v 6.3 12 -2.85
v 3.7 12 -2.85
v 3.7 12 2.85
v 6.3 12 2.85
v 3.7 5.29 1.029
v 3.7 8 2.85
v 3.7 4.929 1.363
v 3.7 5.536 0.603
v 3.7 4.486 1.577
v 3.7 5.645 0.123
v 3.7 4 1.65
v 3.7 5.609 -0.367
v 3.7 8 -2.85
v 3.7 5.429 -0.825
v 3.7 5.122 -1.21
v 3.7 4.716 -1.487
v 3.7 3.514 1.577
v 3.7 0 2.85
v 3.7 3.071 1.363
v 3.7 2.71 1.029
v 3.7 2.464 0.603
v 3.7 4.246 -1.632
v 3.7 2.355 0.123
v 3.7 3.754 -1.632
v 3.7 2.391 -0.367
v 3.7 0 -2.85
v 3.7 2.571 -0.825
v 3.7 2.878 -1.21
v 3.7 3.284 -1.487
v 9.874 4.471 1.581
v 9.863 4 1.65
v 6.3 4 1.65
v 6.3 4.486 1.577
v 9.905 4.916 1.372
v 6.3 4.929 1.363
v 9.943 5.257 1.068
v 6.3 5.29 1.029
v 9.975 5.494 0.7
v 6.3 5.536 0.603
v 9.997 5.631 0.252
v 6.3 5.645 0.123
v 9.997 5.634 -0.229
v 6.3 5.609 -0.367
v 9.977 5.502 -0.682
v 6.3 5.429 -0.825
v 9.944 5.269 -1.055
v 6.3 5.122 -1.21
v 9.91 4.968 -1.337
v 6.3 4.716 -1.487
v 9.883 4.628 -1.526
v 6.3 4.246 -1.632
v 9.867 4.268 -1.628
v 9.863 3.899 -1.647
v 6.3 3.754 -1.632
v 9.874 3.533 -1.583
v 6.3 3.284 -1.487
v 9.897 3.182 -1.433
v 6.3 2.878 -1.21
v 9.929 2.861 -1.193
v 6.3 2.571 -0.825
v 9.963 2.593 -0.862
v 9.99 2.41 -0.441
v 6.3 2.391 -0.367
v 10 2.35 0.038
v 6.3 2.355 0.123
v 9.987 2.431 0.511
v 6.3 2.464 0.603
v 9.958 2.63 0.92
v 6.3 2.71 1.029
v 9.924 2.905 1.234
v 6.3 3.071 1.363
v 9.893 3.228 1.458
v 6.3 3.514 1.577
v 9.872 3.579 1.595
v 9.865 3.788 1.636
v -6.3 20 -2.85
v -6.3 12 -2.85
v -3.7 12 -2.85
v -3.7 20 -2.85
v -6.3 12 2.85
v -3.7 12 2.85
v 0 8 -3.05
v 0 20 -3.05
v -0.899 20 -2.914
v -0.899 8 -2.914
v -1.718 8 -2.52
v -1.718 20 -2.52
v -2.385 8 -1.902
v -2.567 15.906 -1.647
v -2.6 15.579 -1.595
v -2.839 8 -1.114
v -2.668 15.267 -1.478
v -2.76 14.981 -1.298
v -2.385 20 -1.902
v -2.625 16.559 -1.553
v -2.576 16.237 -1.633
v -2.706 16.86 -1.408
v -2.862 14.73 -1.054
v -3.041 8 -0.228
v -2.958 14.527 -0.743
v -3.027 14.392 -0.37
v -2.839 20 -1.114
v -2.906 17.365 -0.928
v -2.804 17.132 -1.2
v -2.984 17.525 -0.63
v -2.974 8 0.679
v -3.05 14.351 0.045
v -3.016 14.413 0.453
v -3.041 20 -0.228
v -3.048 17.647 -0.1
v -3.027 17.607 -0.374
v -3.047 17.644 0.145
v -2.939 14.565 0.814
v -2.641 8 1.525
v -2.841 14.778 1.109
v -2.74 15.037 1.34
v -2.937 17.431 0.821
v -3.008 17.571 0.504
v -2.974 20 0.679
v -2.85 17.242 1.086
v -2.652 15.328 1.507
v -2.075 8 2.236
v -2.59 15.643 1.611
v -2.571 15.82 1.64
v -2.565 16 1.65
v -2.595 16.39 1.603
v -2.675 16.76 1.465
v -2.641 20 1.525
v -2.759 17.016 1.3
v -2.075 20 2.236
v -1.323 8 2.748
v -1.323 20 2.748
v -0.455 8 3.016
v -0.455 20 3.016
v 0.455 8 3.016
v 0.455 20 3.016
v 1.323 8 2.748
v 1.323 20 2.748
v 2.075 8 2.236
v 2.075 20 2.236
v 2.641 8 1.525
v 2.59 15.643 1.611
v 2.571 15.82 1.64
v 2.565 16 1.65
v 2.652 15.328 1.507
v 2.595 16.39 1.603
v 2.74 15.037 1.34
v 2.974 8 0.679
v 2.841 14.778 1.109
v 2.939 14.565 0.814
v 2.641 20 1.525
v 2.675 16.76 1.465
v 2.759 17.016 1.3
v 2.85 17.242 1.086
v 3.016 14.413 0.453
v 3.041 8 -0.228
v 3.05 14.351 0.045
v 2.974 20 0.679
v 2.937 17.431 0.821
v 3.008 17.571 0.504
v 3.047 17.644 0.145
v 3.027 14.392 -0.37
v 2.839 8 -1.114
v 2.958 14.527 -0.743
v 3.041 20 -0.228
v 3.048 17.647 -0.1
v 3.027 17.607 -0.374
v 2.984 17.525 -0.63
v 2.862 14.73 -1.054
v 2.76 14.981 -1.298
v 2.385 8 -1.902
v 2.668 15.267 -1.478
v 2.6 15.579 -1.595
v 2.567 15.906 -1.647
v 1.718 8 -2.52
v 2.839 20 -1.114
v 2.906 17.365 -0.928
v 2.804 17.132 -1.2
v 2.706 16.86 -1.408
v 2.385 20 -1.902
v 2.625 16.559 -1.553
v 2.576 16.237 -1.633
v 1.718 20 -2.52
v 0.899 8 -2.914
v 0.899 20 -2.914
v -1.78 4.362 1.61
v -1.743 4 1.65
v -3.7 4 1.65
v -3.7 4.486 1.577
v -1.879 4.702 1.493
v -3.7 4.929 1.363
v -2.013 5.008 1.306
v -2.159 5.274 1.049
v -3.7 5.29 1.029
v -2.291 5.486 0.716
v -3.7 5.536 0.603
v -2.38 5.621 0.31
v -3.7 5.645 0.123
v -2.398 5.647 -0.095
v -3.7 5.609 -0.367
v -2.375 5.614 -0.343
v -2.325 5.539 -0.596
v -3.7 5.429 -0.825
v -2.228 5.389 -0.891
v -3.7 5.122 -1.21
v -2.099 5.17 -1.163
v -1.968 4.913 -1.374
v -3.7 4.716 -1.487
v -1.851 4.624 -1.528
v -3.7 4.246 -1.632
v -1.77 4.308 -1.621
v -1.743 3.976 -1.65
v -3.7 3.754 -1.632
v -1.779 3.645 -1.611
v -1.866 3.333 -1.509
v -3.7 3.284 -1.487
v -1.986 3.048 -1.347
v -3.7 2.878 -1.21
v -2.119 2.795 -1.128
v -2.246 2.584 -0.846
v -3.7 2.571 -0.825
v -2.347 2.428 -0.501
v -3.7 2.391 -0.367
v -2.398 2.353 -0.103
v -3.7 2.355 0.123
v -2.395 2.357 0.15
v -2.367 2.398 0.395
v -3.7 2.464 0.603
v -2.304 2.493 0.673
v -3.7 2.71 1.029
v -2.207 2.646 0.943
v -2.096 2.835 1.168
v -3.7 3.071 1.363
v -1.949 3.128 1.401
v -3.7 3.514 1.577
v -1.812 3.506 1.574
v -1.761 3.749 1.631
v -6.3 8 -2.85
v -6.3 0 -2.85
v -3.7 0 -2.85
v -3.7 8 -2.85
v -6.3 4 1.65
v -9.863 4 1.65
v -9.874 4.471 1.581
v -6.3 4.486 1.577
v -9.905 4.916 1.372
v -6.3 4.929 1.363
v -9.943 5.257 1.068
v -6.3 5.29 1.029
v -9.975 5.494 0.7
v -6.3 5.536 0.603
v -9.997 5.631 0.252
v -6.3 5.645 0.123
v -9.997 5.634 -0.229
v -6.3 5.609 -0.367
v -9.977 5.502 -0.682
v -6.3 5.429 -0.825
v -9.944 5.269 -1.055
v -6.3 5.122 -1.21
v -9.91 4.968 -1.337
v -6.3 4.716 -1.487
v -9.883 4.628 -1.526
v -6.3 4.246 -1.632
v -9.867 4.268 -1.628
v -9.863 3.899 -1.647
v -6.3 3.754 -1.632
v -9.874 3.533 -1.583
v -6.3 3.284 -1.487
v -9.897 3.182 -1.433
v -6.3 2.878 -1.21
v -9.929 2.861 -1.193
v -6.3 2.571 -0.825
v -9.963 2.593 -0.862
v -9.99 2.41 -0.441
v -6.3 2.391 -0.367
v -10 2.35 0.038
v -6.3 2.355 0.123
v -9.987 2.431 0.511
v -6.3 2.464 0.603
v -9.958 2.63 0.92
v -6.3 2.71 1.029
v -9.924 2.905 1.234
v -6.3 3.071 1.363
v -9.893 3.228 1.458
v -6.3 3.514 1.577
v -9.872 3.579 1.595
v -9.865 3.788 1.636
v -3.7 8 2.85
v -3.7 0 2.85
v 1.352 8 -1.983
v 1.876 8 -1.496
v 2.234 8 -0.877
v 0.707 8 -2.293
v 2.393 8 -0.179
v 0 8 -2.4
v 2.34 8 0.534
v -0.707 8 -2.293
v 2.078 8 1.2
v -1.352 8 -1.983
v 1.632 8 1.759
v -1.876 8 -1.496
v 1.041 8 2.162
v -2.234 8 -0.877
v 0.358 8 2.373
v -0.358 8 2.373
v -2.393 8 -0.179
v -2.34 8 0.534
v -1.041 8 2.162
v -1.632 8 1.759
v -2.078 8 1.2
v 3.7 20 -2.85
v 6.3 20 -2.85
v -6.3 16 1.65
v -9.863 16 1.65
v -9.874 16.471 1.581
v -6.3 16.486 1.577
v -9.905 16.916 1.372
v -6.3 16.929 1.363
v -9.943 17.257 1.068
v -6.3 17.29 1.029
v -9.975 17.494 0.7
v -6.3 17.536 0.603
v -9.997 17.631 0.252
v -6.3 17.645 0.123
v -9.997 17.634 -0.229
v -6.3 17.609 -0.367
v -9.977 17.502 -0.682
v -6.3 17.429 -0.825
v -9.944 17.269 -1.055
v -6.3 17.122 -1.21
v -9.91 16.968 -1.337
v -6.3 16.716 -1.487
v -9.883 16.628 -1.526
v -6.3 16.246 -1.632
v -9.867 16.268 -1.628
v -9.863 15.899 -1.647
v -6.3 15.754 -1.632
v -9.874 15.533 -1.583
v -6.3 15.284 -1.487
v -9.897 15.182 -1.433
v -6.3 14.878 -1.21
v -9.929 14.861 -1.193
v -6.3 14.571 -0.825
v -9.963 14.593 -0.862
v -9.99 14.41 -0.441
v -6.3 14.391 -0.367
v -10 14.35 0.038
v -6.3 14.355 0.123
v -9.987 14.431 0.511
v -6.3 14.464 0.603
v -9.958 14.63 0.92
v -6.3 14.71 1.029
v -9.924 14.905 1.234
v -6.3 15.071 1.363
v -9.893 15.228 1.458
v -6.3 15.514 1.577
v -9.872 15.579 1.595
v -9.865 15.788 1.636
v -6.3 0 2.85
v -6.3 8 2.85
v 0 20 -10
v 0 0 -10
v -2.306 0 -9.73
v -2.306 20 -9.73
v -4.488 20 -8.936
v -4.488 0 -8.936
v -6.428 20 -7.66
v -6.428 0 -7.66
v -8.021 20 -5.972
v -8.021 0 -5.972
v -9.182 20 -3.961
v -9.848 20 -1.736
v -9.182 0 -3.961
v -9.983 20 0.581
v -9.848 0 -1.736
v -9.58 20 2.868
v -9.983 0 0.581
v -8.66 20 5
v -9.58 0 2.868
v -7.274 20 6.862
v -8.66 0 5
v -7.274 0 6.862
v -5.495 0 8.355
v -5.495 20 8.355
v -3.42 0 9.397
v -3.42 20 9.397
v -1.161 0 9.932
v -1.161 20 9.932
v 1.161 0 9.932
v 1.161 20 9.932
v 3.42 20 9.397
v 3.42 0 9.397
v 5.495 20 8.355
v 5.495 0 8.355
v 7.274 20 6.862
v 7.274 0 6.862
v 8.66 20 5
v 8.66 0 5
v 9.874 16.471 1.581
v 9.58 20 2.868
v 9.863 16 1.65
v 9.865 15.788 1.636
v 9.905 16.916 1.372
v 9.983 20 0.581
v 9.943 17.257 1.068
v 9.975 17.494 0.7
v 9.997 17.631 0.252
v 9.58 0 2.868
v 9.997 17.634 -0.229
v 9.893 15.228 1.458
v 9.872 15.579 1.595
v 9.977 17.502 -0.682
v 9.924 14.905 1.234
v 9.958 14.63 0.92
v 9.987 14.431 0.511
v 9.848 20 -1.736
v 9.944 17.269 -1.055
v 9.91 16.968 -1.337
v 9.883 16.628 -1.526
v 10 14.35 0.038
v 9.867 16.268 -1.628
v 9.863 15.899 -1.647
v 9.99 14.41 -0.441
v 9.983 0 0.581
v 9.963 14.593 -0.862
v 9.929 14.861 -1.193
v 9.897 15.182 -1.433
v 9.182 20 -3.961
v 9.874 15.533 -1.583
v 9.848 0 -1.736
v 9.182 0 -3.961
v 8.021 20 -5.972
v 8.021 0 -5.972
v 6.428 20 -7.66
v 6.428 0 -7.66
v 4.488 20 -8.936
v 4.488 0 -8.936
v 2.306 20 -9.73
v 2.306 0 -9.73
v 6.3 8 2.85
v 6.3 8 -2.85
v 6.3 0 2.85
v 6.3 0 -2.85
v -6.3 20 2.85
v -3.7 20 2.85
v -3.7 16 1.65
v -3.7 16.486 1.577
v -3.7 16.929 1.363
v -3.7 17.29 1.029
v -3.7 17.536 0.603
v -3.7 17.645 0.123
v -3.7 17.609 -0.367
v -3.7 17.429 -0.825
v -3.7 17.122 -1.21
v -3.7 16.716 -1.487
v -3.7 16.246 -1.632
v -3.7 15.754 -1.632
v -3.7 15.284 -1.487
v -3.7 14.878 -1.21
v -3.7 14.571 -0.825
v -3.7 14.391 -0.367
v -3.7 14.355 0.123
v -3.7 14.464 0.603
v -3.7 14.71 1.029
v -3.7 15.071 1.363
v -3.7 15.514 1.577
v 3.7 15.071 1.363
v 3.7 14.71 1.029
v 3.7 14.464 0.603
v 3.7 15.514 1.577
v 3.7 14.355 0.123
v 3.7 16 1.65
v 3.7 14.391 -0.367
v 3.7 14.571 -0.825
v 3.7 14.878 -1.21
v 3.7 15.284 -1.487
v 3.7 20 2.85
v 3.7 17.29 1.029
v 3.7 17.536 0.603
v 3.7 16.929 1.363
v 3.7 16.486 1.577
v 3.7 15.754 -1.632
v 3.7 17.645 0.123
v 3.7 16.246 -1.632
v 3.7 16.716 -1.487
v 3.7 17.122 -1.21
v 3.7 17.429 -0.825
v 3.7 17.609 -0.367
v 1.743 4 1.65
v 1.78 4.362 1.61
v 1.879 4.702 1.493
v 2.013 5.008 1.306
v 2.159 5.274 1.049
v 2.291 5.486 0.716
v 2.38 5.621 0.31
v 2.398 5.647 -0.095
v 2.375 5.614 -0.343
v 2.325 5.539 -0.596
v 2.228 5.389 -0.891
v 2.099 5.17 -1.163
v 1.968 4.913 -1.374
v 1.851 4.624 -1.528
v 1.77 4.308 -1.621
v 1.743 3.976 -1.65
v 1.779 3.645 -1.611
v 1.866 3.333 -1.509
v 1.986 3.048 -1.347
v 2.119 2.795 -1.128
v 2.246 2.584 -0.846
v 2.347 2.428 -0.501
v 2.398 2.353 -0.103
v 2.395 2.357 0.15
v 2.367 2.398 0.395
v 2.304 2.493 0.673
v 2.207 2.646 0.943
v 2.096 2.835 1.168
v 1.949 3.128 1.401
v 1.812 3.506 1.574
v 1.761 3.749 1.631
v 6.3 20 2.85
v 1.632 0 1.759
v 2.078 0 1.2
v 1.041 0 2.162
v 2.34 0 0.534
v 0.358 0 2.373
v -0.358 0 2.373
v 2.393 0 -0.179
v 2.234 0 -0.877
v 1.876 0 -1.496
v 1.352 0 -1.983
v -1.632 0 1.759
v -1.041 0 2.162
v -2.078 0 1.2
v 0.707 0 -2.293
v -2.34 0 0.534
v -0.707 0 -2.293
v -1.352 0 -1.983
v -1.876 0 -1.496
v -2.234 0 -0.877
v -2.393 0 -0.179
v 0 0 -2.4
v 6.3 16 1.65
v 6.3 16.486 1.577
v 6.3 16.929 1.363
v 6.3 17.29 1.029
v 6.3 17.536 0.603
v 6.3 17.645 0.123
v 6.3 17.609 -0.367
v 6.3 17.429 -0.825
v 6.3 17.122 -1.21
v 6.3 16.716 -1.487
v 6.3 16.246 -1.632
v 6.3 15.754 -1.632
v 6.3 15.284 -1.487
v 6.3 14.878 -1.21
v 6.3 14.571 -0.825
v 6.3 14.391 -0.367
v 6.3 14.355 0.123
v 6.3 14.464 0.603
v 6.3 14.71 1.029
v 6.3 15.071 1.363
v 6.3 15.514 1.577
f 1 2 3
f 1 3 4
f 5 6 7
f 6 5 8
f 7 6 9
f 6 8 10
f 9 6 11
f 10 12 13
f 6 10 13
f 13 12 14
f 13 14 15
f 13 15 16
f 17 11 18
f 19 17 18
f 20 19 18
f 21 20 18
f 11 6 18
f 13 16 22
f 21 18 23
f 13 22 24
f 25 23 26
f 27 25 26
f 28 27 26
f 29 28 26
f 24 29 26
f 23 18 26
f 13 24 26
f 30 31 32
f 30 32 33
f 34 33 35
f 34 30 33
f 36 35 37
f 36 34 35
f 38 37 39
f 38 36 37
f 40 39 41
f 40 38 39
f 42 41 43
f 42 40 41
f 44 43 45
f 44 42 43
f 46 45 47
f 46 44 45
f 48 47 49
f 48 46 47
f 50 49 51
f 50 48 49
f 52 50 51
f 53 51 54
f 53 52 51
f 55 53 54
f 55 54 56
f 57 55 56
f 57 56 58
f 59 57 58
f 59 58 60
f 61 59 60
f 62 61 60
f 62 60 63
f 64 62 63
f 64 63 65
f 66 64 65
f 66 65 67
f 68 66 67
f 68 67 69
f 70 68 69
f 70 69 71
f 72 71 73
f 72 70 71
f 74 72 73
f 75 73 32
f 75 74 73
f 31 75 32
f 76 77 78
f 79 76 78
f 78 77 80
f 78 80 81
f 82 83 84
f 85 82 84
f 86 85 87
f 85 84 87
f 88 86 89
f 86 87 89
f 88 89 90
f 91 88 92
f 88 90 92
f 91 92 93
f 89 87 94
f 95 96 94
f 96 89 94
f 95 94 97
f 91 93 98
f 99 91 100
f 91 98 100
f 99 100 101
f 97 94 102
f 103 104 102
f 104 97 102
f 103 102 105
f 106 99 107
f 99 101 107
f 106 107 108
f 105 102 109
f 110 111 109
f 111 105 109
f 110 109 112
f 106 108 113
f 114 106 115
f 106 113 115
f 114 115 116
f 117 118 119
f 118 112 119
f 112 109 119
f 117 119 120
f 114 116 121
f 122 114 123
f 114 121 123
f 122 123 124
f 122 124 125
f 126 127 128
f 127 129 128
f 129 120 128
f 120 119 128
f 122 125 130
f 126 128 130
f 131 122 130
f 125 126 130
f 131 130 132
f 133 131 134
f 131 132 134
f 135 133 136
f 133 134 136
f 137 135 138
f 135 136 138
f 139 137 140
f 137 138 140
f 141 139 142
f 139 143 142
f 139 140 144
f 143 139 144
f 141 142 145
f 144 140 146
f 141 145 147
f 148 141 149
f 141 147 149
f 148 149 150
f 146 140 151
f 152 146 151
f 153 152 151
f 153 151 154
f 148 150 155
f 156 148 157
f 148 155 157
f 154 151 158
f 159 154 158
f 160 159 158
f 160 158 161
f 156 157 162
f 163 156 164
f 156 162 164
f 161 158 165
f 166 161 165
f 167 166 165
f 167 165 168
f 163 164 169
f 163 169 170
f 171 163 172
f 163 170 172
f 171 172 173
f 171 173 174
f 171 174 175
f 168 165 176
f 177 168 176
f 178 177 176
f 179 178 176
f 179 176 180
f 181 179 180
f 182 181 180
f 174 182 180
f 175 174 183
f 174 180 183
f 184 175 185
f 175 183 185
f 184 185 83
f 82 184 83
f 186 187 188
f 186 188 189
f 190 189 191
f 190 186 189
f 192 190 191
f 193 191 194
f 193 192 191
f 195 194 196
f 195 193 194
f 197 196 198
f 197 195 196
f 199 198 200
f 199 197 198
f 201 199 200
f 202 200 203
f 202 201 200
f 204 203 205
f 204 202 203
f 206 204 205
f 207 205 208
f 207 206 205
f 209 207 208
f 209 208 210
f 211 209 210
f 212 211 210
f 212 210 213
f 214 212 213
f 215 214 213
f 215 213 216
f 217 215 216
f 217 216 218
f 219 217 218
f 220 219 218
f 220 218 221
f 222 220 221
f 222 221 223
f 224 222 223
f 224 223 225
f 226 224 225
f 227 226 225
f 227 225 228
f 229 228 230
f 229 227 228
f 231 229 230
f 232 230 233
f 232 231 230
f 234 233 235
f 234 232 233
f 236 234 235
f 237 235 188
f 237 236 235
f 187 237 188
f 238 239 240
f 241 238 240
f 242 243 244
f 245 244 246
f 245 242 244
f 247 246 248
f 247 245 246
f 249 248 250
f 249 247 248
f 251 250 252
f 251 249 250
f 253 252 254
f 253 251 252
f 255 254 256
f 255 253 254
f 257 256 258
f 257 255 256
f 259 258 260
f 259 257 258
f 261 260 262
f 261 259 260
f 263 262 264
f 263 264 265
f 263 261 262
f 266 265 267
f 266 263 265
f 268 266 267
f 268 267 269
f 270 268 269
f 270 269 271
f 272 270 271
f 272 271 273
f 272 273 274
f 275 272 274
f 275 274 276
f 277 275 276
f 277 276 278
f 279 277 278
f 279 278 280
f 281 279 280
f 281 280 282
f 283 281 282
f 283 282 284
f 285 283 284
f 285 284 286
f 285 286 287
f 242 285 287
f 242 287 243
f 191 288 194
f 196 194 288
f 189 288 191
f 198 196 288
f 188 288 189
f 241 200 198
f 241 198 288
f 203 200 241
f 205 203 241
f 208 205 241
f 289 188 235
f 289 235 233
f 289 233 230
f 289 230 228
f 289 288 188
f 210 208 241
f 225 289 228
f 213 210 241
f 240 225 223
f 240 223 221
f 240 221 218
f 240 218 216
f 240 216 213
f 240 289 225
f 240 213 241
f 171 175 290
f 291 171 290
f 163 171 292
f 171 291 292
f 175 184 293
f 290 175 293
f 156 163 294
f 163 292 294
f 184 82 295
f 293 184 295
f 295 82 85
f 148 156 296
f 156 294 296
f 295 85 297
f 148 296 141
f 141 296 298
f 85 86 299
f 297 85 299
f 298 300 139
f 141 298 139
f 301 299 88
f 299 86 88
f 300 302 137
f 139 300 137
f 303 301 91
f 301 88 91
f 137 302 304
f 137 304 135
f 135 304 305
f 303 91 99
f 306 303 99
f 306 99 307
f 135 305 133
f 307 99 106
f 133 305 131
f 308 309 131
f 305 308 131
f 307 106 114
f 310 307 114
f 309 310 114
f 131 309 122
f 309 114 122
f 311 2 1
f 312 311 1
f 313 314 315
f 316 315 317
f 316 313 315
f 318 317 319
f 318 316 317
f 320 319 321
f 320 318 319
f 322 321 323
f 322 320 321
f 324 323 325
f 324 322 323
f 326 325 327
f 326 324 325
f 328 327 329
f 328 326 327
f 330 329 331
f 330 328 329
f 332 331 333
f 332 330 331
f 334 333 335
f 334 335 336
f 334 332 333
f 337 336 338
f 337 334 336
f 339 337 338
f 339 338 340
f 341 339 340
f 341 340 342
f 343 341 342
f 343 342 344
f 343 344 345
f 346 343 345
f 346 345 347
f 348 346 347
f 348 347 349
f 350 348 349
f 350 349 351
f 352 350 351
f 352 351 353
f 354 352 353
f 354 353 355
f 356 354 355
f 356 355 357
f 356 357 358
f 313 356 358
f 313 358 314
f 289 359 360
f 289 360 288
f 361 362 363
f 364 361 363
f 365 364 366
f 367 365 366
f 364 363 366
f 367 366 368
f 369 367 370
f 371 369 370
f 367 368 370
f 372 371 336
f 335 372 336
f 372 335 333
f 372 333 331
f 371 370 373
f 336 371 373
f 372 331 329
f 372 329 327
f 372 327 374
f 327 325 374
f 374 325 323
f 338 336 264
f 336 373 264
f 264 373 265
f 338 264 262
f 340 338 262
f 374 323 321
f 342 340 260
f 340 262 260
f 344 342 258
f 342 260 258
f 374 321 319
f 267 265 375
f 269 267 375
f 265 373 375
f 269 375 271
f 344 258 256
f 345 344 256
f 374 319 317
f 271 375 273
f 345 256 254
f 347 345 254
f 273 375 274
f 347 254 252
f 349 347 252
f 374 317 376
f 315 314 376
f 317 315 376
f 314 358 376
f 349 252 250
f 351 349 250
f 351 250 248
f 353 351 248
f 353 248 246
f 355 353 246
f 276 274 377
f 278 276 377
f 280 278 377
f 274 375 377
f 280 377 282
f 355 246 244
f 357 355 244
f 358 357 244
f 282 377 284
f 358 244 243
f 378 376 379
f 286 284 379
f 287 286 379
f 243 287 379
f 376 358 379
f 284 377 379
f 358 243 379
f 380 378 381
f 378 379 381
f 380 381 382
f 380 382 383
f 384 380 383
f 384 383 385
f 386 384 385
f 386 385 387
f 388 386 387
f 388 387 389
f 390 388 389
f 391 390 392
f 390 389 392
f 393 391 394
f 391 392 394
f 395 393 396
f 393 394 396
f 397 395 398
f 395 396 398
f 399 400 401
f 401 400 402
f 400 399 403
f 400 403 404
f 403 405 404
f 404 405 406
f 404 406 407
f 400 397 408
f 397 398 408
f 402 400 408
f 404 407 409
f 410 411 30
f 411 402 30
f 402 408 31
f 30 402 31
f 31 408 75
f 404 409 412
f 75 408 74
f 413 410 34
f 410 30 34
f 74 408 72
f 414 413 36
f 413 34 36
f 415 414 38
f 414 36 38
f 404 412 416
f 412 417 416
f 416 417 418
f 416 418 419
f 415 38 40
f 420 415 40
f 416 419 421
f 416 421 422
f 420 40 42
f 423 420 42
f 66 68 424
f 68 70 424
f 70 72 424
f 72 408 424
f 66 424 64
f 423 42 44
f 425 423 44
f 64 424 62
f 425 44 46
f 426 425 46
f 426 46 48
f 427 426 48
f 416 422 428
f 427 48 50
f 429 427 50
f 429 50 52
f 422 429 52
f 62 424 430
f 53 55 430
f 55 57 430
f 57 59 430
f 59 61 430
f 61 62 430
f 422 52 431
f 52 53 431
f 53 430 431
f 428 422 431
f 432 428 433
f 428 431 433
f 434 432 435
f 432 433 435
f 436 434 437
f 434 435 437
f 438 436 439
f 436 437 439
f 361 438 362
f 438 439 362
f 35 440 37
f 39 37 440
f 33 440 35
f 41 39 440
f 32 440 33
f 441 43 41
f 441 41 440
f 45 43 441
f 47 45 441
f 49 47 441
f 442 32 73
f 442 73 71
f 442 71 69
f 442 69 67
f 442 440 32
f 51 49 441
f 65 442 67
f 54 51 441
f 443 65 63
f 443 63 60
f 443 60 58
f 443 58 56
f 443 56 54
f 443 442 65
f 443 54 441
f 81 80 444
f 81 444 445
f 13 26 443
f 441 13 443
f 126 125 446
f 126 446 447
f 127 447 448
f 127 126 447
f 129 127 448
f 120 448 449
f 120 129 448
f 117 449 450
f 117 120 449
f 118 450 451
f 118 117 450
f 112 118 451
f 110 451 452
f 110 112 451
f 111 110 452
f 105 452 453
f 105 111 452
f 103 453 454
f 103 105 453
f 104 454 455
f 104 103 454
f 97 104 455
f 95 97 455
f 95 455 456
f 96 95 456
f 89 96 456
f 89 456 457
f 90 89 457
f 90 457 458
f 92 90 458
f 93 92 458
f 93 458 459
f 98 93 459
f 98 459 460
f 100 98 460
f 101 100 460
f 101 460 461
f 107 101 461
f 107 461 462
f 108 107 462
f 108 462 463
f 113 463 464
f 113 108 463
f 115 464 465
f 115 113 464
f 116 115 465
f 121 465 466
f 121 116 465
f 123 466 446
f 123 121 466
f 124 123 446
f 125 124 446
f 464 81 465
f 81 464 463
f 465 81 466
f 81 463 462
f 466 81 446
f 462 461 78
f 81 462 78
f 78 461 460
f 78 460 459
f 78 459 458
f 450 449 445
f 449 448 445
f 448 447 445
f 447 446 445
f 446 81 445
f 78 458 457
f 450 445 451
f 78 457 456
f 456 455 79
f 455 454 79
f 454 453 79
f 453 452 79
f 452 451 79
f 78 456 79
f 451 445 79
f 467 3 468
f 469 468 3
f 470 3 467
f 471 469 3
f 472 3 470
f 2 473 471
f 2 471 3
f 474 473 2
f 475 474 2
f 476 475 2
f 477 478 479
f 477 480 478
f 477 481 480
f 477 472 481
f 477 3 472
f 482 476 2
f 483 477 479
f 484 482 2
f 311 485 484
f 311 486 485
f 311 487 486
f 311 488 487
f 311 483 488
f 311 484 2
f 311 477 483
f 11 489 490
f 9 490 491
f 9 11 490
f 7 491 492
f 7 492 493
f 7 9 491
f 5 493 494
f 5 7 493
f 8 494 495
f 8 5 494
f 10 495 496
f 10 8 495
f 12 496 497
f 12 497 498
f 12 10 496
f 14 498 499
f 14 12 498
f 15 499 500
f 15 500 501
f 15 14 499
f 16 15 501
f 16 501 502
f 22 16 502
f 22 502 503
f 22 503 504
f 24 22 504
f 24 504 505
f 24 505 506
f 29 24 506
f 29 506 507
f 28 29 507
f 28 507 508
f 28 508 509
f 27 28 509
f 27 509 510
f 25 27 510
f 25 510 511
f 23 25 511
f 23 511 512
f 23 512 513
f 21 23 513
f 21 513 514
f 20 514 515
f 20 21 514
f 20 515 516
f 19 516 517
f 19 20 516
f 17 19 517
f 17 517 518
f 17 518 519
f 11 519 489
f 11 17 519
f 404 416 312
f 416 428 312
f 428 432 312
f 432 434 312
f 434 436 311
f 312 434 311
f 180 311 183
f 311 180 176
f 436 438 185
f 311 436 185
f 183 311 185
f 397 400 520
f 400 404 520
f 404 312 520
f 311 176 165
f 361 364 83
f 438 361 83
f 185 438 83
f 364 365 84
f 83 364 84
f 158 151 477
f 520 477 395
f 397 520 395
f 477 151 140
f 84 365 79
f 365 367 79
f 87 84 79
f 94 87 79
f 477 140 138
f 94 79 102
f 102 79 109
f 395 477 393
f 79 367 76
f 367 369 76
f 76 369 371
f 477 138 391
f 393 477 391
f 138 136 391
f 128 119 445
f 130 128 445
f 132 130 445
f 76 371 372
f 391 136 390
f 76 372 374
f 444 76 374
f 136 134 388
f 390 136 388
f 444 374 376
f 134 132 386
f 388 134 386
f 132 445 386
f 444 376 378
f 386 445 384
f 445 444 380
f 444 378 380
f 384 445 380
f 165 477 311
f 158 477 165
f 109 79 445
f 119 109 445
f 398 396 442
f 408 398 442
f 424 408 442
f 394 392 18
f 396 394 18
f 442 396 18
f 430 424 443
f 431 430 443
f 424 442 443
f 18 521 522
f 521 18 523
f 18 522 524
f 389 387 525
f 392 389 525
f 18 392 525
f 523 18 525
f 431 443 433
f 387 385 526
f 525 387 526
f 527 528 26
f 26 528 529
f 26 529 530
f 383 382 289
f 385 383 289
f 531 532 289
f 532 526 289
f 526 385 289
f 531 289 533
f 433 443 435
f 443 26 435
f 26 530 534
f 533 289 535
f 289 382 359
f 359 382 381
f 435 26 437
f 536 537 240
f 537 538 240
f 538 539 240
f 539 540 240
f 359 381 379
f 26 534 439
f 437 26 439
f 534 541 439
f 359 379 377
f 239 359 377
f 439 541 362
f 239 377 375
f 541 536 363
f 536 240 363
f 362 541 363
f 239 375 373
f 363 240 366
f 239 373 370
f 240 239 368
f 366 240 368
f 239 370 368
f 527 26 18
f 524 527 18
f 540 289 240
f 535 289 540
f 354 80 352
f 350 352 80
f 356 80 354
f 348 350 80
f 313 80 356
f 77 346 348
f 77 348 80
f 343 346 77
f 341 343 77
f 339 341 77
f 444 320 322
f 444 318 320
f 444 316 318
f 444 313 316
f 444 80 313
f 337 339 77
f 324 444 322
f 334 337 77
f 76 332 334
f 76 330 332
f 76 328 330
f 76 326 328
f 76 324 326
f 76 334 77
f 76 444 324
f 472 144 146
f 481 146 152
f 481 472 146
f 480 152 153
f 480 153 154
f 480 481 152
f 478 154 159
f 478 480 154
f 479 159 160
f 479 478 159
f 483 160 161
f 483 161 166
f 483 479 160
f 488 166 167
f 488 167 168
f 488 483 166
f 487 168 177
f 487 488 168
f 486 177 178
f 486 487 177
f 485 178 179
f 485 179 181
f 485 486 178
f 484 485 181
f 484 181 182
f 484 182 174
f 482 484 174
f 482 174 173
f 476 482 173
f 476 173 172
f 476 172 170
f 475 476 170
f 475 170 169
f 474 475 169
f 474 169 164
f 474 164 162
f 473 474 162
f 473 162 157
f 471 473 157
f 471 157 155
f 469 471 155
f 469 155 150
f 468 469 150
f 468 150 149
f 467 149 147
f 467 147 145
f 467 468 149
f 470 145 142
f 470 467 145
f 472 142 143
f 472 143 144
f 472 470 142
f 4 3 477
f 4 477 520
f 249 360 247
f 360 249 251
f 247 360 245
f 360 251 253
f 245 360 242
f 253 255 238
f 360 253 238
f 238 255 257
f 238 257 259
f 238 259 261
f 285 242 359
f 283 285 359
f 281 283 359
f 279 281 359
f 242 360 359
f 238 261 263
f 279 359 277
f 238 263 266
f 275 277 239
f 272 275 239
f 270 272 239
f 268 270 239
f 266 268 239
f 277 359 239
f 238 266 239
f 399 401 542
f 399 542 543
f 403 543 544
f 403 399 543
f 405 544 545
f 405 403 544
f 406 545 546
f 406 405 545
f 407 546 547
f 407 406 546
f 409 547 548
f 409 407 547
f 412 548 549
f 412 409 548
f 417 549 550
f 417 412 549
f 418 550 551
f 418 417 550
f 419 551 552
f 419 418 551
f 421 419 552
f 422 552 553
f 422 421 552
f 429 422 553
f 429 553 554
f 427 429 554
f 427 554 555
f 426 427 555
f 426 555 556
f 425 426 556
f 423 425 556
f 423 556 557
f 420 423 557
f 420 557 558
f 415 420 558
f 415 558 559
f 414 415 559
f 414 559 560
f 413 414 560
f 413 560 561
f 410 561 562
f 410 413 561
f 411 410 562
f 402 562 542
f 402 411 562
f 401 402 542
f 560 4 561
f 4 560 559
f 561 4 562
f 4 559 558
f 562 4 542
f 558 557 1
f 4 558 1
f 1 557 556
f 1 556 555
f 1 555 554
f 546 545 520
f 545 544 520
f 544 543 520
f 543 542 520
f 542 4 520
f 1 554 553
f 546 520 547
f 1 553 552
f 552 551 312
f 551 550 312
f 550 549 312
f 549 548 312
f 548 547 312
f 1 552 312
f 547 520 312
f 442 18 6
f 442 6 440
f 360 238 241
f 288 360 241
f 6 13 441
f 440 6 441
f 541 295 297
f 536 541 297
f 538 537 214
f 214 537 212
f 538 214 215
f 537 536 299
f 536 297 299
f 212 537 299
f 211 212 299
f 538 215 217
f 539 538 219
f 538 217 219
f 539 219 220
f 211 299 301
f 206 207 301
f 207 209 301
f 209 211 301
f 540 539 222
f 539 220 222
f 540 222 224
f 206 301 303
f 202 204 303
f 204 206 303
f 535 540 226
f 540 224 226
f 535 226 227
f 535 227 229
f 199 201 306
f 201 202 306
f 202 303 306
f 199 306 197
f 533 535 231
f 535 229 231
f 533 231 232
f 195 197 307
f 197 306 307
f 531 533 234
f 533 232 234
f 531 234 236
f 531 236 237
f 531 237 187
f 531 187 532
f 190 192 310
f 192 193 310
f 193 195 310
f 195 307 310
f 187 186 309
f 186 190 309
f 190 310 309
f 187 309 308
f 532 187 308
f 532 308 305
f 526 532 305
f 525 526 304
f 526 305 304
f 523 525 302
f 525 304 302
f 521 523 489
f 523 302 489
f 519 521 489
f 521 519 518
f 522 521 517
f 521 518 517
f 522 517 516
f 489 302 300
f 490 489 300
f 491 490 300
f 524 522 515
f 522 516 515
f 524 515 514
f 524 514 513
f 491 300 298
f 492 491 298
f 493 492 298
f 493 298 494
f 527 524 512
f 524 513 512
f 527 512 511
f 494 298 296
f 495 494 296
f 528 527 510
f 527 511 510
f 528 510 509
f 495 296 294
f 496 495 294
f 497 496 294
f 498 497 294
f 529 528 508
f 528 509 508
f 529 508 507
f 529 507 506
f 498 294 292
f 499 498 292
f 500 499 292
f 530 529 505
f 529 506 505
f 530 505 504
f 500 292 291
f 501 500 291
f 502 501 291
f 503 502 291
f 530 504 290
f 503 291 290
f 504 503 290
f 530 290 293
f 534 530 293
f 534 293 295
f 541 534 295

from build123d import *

# Parameters (mm, degrees)
ESBO_O2_W                  = 2.6
ESBO_O2_H                  = 5.7
CORTE_EXTRUS_O1_DEPTH      = 8
CORTE_EXTRUS_O2_START      = -20
ESBO_O2_2_W                = 2.6
ESBO_O2_2_H                = 5.7
CORTE_EXTRUS_O2_DEPTH      = 8
CORTE_EXTRUS_O3_DEPTH      = 27.223844112
CORTE_EXTRUS_O3_DEPTH_BACK = 27.223844112
ESBO_O3_R                  = 1.65


with BuildPart() as part:
    # Esboço1 → Revolução1 (revolve)
    with BuildSketch(Plane.XY, mode=Mode.PRIVATE) as revolu_o1_sk:
        Polygon((3.05, 20), (10, 20), (10, 0), (2.4, 0), (2.4, 8), (3.05, 8), align=None)
    revolve(revolu_o1_sk.sketch.rotate(Axis((0, 0, 0), (0, 1, 0)), 90), axis=Axis((0, 0, 0), (0, 1, 0)))

    # Esboço2 → Corte-extrusão1 (cut)
    with BuildSketch(Plane(origin=(0, 20, 0), x_dir=(1, 0, 0), z_dir=(0, 1, 0))):
        with Locations((5, 0)):
            Rectangle(ESBO_O2_W, ESBO_O2_H)
        with Locations((-5, 0)):
            Rectangle(ESBO_O2_W, ESBO_O2_H)
    extrude(amount=-CORTE_EXTRUS_O1_DEPTH, mode=Mode.SUBTRACT)

    # Esboço2<2> → Corte-extrusão2 (cut)
    with BuildSketch(Plane(origin=(0, 20, 0), x_dir=(1, 0, 0), z_dir=(0, 1, 0)).offset(CORTE_EXTRUS_O2_START)):
        with Locations((5, 0)):
            Rectangle(ESBO_O2_2_W, ESBO_O2_2_H)
        with Locations((-5, 0)):
            Rectangle(ESBO_O2_2_W, ESBO_O2_2_H)
    extrude(amount=CORTE_EXTRUS_O2_DEPTH, mode=Mode.SUBTRACT)

    # Esboço3 → Corte-extrusão3 (cut, two sides: drawn at the far end of the back side and taken through both)
    with BuildSketch(Plane.ZY.offset(3.7).offset(-CORTE_EXTRUS_O3_DEPTH_BACK)):
        with Locations((0, 4)):
            Circle(ESBO_O3_R)
        with Locations((0, 16)):
            Circle(ESBO_O3_R)
    extrude(amount=CORTE_EXTRUS_O3_DEPTH + CORTE_EXTRUS_O3_DEPTH_BACK, mode=Mode.SUBTRACT)


solid = part.part
